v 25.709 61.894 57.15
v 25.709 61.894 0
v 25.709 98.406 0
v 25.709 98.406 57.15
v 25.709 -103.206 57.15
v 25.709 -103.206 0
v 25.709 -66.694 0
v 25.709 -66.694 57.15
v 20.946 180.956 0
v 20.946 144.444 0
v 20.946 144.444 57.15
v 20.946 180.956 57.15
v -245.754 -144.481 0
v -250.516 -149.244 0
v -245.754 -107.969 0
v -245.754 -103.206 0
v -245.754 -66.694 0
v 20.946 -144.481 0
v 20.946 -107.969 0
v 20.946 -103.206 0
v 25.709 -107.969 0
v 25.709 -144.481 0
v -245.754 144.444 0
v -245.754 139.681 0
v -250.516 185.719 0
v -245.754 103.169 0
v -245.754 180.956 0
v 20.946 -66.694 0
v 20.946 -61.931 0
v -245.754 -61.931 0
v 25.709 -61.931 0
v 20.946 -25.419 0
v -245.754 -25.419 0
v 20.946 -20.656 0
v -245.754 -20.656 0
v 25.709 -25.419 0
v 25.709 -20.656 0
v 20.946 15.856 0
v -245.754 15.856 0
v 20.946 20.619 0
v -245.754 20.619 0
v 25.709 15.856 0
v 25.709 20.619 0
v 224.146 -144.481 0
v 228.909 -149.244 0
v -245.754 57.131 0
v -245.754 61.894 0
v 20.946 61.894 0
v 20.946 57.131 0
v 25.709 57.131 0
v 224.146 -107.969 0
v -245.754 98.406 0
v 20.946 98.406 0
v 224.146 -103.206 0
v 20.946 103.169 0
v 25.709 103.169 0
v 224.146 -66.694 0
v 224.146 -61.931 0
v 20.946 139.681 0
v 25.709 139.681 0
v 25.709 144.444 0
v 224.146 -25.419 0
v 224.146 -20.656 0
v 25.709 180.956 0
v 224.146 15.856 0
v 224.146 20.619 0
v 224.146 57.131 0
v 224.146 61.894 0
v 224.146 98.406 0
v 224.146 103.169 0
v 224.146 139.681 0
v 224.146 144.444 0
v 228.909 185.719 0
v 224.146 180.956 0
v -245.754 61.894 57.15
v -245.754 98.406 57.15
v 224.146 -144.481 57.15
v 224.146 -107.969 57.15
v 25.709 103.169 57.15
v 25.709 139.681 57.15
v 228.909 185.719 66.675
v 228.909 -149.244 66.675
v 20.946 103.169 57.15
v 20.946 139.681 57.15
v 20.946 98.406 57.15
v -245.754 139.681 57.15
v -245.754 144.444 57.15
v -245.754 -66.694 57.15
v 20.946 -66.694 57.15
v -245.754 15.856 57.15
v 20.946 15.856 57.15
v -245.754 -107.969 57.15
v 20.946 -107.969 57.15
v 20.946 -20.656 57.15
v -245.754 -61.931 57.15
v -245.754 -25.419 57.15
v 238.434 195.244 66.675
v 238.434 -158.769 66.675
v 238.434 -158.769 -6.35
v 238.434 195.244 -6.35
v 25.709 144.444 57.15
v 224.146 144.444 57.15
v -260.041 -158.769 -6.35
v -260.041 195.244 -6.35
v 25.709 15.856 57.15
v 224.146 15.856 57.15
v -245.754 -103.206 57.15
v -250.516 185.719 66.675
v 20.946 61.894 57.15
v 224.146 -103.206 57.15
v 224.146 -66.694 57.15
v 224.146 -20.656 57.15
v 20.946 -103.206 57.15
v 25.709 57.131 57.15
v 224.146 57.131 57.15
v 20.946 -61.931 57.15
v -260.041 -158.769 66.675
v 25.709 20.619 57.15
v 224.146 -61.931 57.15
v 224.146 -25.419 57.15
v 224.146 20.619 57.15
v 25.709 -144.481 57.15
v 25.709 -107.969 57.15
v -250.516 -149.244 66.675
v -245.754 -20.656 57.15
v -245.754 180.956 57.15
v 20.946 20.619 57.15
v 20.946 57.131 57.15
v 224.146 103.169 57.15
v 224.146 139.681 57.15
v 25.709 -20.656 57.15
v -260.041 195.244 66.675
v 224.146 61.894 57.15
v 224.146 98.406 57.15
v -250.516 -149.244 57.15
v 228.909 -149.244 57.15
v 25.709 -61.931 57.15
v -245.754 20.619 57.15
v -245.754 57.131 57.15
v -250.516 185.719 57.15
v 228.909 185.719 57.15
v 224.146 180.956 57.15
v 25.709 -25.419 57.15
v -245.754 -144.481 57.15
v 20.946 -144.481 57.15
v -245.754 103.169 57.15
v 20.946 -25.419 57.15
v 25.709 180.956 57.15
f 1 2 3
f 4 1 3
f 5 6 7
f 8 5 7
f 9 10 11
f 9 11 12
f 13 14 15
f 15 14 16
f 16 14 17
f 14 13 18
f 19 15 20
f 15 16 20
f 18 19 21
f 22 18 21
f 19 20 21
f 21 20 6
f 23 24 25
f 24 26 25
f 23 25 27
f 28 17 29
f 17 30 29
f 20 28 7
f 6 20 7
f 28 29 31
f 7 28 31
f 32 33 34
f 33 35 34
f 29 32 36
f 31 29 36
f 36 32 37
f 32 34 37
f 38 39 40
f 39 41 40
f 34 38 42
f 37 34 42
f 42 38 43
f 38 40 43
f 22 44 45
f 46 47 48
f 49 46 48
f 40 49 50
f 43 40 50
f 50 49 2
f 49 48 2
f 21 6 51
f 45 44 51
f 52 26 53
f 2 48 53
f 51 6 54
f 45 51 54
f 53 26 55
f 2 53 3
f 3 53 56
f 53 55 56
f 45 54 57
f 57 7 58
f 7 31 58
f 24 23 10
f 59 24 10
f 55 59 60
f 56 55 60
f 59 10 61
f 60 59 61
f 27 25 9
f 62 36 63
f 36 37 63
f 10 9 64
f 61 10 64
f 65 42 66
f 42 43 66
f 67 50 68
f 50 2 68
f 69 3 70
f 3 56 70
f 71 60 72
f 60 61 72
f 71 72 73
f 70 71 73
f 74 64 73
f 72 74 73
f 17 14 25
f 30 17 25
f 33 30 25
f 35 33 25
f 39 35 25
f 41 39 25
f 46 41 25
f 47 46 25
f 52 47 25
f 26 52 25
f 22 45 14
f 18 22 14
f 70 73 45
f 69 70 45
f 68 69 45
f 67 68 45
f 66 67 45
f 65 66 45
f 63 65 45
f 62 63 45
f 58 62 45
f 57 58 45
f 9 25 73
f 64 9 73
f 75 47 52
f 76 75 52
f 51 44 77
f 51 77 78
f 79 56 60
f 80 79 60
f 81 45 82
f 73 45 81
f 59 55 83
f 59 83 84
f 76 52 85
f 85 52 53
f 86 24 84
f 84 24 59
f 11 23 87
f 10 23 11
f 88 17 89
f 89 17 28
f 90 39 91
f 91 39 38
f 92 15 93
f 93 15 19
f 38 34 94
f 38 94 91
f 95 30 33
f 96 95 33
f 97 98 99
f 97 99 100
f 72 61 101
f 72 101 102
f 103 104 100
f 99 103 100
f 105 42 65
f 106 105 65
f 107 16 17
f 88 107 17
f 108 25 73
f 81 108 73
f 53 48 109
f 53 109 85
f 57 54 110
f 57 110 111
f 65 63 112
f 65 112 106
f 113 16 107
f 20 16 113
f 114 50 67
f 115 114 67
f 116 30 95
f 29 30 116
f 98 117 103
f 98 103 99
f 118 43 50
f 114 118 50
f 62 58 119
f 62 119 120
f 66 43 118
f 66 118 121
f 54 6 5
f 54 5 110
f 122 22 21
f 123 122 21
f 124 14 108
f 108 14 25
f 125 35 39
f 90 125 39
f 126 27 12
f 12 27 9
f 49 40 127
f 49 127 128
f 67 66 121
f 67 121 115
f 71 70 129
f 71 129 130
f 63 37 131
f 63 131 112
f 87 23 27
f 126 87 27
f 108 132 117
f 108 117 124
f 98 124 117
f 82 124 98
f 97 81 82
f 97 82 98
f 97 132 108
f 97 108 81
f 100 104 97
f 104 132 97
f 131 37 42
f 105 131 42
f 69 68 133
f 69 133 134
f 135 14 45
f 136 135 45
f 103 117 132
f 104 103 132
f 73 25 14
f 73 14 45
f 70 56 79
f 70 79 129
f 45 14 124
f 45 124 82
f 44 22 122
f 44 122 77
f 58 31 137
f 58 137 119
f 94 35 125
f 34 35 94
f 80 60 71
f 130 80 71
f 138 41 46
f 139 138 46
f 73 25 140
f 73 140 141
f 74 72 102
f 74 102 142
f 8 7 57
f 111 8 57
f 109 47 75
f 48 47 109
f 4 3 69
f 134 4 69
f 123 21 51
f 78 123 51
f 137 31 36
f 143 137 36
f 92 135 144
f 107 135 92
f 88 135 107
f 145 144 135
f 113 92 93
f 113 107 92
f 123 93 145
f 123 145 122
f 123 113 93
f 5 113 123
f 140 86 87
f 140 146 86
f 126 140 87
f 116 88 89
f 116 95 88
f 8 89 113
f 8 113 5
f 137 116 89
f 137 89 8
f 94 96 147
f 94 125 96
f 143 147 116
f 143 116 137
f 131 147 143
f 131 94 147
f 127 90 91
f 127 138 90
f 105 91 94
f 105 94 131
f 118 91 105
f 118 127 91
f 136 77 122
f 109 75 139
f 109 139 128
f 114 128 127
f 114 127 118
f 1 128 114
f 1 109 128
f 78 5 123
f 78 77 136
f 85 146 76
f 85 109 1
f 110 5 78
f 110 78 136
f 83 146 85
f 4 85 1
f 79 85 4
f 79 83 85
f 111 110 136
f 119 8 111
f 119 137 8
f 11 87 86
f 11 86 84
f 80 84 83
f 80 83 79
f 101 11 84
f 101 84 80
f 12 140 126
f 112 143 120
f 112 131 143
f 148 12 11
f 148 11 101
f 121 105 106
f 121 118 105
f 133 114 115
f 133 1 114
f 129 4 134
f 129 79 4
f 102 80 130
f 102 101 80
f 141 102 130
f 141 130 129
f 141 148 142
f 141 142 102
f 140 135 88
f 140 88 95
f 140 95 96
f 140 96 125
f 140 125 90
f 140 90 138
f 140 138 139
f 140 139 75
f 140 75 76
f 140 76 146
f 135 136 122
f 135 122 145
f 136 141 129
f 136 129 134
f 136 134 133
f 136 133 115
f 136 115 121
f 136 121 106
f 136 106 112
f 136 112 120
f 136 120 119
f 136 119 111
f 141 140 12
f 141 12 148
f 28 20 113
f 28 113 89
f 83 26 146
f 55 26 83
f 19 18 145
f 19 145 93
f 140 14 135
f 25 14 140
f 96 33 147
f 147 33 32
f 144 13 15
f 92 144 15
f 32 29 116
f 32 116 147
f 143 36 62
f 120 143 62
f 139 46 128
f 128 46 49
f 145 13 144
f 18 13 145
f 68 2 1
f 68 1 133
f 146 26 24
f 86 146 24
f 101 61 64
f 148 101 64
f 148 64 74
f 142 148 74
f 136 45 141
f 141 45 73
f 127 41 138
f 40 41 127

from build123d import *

# Parameters (mm, degrees)
F0_W     = 498.475
F0_H     = 354.0125
F0_W_2   = 479.425
F0_H_2   = 334.9625
F1_DEPTH = 66.675
F0_W_3   = 266.7
F0_H_3   = 36.5125
F0_W_4   = 198.4375
F2_DEPTH = 57.15
F3_W     = 498.475
F3_H     = 354.0125
F4_DEPTH = 6.35


with BuildPart() as f1:
    # F0 (on Top) → F1 (new body)
    with BuildSketch(Plane.XY):
        with Locations((-10.8039700516, 18.2372602986)):
            Rectangle(F0_W, F0_H)
        with Locations((-10.8039700516, 18.2372602986)):
            Rectangle(F0_W_2, F0_H_2, mode=Mode.SUBTRACT)
    extrude(amount=F1_DEPTH)

    # F3 (on face) → F4 (join)
    with BuildSketch(Plane.XY):
        with Locations((-10.8039700516, 18.2372602986)):
            Rectangle(F3_W, F3_H)
    extrude(amount=-F4_DEPTH)


with BuildPart() as f2:
    # F0 (on Top) → F2 (new body)
    with BuildSketch(Plane.XY):
        with Locations((-10.8039700516, 18.2372602986)):
            Rectangle(F0_W_2, F0_H_2)
        with Locations((-112.4039700516, -126.2252397014)):
            Rectangle(F0_W_3, F0_H_3, mode=Mode.SUBTRACT)
        with Locations((-112.4039700516, -84.9502397014)):
            Rectangle(F0_W_3, F0_H_3, mode=Mode.SUBTRACT)
        with Locations((-112.4039700516, -43.6752397014)):
            Rectangle(F0_W_3, F0_H_3, mode=Mode.SUBTRACT)
        with Locations((-112.4039700516, -2.4002397014)):
            Rectangle(F0_W_3, F0_H_3, mode=Mode.SUBTRACT)
        with Locations((124.9272799484, -126.2252397014)):
            Rectangle(F0_W_4, F0_H_3, mode=Mode.SUBTRACT)
        with Locations((124.9272799484, -84.9502397014)):
            Rectangle(F0_W_4, F0_H_3, mode=Mode.SUBTRACT)
        with Locations((124.9272799484, -43.6752397014)):
            Rectangle(F0_W_4, F0_H_3, mode=Mode.SUBTRACT)
        with Locations((124.9272799484, -2.4002397014)):
            Rectangle(F0_W_4, F0_H_3, mode=Mode.SUBTRACT)
        with Locations((-112.4039700516, 38.8747602986)):
            Rectangle(F0_W_3, F0_H_3, mode=Mode.SUBTRACT)
        with Locations((-112.4039700516, 80.1497602986)):
            Rectangle(F0_W_3, F0_H_3, mode=Mode.SUBTRACT)
        with Locations((-112.4039700516, 121.4247602986)):
            Rectangle(F0_W_3, F0_H_3, mode=Mode.SUBTRACT)
        with Locations((-112.4039700516, 162.6997602986)):
            Rectangle(F0_W_3, F0_H_3, mode=Mode.SUBTRACT)
        with Locations((124.9272799484, 38.8747602986)):
            Rectangle(F0_W_4, F0_H_3, mode=Mode.SUBTRACT)
        with Locations((124.9272799484, 80.1497602986)):
            Rectangle(F0_W_4, F0_H_3, mode=Mode.SUBTRACT)
        with Locations((124.9272799484, 121.4247602986)):
            Rectangle(F0_W_4, F0_H_3, mode=Mode.SUBTRACT)
        with Locations((124.9272799484, 162.6997602986)):
            Rectangle(F0_W_4, F0_H_3, mode=Mode.SUBTRACT)
    extrude(amount=F2_DEPTH)


solid = Compound([f1.part, f2.part])
